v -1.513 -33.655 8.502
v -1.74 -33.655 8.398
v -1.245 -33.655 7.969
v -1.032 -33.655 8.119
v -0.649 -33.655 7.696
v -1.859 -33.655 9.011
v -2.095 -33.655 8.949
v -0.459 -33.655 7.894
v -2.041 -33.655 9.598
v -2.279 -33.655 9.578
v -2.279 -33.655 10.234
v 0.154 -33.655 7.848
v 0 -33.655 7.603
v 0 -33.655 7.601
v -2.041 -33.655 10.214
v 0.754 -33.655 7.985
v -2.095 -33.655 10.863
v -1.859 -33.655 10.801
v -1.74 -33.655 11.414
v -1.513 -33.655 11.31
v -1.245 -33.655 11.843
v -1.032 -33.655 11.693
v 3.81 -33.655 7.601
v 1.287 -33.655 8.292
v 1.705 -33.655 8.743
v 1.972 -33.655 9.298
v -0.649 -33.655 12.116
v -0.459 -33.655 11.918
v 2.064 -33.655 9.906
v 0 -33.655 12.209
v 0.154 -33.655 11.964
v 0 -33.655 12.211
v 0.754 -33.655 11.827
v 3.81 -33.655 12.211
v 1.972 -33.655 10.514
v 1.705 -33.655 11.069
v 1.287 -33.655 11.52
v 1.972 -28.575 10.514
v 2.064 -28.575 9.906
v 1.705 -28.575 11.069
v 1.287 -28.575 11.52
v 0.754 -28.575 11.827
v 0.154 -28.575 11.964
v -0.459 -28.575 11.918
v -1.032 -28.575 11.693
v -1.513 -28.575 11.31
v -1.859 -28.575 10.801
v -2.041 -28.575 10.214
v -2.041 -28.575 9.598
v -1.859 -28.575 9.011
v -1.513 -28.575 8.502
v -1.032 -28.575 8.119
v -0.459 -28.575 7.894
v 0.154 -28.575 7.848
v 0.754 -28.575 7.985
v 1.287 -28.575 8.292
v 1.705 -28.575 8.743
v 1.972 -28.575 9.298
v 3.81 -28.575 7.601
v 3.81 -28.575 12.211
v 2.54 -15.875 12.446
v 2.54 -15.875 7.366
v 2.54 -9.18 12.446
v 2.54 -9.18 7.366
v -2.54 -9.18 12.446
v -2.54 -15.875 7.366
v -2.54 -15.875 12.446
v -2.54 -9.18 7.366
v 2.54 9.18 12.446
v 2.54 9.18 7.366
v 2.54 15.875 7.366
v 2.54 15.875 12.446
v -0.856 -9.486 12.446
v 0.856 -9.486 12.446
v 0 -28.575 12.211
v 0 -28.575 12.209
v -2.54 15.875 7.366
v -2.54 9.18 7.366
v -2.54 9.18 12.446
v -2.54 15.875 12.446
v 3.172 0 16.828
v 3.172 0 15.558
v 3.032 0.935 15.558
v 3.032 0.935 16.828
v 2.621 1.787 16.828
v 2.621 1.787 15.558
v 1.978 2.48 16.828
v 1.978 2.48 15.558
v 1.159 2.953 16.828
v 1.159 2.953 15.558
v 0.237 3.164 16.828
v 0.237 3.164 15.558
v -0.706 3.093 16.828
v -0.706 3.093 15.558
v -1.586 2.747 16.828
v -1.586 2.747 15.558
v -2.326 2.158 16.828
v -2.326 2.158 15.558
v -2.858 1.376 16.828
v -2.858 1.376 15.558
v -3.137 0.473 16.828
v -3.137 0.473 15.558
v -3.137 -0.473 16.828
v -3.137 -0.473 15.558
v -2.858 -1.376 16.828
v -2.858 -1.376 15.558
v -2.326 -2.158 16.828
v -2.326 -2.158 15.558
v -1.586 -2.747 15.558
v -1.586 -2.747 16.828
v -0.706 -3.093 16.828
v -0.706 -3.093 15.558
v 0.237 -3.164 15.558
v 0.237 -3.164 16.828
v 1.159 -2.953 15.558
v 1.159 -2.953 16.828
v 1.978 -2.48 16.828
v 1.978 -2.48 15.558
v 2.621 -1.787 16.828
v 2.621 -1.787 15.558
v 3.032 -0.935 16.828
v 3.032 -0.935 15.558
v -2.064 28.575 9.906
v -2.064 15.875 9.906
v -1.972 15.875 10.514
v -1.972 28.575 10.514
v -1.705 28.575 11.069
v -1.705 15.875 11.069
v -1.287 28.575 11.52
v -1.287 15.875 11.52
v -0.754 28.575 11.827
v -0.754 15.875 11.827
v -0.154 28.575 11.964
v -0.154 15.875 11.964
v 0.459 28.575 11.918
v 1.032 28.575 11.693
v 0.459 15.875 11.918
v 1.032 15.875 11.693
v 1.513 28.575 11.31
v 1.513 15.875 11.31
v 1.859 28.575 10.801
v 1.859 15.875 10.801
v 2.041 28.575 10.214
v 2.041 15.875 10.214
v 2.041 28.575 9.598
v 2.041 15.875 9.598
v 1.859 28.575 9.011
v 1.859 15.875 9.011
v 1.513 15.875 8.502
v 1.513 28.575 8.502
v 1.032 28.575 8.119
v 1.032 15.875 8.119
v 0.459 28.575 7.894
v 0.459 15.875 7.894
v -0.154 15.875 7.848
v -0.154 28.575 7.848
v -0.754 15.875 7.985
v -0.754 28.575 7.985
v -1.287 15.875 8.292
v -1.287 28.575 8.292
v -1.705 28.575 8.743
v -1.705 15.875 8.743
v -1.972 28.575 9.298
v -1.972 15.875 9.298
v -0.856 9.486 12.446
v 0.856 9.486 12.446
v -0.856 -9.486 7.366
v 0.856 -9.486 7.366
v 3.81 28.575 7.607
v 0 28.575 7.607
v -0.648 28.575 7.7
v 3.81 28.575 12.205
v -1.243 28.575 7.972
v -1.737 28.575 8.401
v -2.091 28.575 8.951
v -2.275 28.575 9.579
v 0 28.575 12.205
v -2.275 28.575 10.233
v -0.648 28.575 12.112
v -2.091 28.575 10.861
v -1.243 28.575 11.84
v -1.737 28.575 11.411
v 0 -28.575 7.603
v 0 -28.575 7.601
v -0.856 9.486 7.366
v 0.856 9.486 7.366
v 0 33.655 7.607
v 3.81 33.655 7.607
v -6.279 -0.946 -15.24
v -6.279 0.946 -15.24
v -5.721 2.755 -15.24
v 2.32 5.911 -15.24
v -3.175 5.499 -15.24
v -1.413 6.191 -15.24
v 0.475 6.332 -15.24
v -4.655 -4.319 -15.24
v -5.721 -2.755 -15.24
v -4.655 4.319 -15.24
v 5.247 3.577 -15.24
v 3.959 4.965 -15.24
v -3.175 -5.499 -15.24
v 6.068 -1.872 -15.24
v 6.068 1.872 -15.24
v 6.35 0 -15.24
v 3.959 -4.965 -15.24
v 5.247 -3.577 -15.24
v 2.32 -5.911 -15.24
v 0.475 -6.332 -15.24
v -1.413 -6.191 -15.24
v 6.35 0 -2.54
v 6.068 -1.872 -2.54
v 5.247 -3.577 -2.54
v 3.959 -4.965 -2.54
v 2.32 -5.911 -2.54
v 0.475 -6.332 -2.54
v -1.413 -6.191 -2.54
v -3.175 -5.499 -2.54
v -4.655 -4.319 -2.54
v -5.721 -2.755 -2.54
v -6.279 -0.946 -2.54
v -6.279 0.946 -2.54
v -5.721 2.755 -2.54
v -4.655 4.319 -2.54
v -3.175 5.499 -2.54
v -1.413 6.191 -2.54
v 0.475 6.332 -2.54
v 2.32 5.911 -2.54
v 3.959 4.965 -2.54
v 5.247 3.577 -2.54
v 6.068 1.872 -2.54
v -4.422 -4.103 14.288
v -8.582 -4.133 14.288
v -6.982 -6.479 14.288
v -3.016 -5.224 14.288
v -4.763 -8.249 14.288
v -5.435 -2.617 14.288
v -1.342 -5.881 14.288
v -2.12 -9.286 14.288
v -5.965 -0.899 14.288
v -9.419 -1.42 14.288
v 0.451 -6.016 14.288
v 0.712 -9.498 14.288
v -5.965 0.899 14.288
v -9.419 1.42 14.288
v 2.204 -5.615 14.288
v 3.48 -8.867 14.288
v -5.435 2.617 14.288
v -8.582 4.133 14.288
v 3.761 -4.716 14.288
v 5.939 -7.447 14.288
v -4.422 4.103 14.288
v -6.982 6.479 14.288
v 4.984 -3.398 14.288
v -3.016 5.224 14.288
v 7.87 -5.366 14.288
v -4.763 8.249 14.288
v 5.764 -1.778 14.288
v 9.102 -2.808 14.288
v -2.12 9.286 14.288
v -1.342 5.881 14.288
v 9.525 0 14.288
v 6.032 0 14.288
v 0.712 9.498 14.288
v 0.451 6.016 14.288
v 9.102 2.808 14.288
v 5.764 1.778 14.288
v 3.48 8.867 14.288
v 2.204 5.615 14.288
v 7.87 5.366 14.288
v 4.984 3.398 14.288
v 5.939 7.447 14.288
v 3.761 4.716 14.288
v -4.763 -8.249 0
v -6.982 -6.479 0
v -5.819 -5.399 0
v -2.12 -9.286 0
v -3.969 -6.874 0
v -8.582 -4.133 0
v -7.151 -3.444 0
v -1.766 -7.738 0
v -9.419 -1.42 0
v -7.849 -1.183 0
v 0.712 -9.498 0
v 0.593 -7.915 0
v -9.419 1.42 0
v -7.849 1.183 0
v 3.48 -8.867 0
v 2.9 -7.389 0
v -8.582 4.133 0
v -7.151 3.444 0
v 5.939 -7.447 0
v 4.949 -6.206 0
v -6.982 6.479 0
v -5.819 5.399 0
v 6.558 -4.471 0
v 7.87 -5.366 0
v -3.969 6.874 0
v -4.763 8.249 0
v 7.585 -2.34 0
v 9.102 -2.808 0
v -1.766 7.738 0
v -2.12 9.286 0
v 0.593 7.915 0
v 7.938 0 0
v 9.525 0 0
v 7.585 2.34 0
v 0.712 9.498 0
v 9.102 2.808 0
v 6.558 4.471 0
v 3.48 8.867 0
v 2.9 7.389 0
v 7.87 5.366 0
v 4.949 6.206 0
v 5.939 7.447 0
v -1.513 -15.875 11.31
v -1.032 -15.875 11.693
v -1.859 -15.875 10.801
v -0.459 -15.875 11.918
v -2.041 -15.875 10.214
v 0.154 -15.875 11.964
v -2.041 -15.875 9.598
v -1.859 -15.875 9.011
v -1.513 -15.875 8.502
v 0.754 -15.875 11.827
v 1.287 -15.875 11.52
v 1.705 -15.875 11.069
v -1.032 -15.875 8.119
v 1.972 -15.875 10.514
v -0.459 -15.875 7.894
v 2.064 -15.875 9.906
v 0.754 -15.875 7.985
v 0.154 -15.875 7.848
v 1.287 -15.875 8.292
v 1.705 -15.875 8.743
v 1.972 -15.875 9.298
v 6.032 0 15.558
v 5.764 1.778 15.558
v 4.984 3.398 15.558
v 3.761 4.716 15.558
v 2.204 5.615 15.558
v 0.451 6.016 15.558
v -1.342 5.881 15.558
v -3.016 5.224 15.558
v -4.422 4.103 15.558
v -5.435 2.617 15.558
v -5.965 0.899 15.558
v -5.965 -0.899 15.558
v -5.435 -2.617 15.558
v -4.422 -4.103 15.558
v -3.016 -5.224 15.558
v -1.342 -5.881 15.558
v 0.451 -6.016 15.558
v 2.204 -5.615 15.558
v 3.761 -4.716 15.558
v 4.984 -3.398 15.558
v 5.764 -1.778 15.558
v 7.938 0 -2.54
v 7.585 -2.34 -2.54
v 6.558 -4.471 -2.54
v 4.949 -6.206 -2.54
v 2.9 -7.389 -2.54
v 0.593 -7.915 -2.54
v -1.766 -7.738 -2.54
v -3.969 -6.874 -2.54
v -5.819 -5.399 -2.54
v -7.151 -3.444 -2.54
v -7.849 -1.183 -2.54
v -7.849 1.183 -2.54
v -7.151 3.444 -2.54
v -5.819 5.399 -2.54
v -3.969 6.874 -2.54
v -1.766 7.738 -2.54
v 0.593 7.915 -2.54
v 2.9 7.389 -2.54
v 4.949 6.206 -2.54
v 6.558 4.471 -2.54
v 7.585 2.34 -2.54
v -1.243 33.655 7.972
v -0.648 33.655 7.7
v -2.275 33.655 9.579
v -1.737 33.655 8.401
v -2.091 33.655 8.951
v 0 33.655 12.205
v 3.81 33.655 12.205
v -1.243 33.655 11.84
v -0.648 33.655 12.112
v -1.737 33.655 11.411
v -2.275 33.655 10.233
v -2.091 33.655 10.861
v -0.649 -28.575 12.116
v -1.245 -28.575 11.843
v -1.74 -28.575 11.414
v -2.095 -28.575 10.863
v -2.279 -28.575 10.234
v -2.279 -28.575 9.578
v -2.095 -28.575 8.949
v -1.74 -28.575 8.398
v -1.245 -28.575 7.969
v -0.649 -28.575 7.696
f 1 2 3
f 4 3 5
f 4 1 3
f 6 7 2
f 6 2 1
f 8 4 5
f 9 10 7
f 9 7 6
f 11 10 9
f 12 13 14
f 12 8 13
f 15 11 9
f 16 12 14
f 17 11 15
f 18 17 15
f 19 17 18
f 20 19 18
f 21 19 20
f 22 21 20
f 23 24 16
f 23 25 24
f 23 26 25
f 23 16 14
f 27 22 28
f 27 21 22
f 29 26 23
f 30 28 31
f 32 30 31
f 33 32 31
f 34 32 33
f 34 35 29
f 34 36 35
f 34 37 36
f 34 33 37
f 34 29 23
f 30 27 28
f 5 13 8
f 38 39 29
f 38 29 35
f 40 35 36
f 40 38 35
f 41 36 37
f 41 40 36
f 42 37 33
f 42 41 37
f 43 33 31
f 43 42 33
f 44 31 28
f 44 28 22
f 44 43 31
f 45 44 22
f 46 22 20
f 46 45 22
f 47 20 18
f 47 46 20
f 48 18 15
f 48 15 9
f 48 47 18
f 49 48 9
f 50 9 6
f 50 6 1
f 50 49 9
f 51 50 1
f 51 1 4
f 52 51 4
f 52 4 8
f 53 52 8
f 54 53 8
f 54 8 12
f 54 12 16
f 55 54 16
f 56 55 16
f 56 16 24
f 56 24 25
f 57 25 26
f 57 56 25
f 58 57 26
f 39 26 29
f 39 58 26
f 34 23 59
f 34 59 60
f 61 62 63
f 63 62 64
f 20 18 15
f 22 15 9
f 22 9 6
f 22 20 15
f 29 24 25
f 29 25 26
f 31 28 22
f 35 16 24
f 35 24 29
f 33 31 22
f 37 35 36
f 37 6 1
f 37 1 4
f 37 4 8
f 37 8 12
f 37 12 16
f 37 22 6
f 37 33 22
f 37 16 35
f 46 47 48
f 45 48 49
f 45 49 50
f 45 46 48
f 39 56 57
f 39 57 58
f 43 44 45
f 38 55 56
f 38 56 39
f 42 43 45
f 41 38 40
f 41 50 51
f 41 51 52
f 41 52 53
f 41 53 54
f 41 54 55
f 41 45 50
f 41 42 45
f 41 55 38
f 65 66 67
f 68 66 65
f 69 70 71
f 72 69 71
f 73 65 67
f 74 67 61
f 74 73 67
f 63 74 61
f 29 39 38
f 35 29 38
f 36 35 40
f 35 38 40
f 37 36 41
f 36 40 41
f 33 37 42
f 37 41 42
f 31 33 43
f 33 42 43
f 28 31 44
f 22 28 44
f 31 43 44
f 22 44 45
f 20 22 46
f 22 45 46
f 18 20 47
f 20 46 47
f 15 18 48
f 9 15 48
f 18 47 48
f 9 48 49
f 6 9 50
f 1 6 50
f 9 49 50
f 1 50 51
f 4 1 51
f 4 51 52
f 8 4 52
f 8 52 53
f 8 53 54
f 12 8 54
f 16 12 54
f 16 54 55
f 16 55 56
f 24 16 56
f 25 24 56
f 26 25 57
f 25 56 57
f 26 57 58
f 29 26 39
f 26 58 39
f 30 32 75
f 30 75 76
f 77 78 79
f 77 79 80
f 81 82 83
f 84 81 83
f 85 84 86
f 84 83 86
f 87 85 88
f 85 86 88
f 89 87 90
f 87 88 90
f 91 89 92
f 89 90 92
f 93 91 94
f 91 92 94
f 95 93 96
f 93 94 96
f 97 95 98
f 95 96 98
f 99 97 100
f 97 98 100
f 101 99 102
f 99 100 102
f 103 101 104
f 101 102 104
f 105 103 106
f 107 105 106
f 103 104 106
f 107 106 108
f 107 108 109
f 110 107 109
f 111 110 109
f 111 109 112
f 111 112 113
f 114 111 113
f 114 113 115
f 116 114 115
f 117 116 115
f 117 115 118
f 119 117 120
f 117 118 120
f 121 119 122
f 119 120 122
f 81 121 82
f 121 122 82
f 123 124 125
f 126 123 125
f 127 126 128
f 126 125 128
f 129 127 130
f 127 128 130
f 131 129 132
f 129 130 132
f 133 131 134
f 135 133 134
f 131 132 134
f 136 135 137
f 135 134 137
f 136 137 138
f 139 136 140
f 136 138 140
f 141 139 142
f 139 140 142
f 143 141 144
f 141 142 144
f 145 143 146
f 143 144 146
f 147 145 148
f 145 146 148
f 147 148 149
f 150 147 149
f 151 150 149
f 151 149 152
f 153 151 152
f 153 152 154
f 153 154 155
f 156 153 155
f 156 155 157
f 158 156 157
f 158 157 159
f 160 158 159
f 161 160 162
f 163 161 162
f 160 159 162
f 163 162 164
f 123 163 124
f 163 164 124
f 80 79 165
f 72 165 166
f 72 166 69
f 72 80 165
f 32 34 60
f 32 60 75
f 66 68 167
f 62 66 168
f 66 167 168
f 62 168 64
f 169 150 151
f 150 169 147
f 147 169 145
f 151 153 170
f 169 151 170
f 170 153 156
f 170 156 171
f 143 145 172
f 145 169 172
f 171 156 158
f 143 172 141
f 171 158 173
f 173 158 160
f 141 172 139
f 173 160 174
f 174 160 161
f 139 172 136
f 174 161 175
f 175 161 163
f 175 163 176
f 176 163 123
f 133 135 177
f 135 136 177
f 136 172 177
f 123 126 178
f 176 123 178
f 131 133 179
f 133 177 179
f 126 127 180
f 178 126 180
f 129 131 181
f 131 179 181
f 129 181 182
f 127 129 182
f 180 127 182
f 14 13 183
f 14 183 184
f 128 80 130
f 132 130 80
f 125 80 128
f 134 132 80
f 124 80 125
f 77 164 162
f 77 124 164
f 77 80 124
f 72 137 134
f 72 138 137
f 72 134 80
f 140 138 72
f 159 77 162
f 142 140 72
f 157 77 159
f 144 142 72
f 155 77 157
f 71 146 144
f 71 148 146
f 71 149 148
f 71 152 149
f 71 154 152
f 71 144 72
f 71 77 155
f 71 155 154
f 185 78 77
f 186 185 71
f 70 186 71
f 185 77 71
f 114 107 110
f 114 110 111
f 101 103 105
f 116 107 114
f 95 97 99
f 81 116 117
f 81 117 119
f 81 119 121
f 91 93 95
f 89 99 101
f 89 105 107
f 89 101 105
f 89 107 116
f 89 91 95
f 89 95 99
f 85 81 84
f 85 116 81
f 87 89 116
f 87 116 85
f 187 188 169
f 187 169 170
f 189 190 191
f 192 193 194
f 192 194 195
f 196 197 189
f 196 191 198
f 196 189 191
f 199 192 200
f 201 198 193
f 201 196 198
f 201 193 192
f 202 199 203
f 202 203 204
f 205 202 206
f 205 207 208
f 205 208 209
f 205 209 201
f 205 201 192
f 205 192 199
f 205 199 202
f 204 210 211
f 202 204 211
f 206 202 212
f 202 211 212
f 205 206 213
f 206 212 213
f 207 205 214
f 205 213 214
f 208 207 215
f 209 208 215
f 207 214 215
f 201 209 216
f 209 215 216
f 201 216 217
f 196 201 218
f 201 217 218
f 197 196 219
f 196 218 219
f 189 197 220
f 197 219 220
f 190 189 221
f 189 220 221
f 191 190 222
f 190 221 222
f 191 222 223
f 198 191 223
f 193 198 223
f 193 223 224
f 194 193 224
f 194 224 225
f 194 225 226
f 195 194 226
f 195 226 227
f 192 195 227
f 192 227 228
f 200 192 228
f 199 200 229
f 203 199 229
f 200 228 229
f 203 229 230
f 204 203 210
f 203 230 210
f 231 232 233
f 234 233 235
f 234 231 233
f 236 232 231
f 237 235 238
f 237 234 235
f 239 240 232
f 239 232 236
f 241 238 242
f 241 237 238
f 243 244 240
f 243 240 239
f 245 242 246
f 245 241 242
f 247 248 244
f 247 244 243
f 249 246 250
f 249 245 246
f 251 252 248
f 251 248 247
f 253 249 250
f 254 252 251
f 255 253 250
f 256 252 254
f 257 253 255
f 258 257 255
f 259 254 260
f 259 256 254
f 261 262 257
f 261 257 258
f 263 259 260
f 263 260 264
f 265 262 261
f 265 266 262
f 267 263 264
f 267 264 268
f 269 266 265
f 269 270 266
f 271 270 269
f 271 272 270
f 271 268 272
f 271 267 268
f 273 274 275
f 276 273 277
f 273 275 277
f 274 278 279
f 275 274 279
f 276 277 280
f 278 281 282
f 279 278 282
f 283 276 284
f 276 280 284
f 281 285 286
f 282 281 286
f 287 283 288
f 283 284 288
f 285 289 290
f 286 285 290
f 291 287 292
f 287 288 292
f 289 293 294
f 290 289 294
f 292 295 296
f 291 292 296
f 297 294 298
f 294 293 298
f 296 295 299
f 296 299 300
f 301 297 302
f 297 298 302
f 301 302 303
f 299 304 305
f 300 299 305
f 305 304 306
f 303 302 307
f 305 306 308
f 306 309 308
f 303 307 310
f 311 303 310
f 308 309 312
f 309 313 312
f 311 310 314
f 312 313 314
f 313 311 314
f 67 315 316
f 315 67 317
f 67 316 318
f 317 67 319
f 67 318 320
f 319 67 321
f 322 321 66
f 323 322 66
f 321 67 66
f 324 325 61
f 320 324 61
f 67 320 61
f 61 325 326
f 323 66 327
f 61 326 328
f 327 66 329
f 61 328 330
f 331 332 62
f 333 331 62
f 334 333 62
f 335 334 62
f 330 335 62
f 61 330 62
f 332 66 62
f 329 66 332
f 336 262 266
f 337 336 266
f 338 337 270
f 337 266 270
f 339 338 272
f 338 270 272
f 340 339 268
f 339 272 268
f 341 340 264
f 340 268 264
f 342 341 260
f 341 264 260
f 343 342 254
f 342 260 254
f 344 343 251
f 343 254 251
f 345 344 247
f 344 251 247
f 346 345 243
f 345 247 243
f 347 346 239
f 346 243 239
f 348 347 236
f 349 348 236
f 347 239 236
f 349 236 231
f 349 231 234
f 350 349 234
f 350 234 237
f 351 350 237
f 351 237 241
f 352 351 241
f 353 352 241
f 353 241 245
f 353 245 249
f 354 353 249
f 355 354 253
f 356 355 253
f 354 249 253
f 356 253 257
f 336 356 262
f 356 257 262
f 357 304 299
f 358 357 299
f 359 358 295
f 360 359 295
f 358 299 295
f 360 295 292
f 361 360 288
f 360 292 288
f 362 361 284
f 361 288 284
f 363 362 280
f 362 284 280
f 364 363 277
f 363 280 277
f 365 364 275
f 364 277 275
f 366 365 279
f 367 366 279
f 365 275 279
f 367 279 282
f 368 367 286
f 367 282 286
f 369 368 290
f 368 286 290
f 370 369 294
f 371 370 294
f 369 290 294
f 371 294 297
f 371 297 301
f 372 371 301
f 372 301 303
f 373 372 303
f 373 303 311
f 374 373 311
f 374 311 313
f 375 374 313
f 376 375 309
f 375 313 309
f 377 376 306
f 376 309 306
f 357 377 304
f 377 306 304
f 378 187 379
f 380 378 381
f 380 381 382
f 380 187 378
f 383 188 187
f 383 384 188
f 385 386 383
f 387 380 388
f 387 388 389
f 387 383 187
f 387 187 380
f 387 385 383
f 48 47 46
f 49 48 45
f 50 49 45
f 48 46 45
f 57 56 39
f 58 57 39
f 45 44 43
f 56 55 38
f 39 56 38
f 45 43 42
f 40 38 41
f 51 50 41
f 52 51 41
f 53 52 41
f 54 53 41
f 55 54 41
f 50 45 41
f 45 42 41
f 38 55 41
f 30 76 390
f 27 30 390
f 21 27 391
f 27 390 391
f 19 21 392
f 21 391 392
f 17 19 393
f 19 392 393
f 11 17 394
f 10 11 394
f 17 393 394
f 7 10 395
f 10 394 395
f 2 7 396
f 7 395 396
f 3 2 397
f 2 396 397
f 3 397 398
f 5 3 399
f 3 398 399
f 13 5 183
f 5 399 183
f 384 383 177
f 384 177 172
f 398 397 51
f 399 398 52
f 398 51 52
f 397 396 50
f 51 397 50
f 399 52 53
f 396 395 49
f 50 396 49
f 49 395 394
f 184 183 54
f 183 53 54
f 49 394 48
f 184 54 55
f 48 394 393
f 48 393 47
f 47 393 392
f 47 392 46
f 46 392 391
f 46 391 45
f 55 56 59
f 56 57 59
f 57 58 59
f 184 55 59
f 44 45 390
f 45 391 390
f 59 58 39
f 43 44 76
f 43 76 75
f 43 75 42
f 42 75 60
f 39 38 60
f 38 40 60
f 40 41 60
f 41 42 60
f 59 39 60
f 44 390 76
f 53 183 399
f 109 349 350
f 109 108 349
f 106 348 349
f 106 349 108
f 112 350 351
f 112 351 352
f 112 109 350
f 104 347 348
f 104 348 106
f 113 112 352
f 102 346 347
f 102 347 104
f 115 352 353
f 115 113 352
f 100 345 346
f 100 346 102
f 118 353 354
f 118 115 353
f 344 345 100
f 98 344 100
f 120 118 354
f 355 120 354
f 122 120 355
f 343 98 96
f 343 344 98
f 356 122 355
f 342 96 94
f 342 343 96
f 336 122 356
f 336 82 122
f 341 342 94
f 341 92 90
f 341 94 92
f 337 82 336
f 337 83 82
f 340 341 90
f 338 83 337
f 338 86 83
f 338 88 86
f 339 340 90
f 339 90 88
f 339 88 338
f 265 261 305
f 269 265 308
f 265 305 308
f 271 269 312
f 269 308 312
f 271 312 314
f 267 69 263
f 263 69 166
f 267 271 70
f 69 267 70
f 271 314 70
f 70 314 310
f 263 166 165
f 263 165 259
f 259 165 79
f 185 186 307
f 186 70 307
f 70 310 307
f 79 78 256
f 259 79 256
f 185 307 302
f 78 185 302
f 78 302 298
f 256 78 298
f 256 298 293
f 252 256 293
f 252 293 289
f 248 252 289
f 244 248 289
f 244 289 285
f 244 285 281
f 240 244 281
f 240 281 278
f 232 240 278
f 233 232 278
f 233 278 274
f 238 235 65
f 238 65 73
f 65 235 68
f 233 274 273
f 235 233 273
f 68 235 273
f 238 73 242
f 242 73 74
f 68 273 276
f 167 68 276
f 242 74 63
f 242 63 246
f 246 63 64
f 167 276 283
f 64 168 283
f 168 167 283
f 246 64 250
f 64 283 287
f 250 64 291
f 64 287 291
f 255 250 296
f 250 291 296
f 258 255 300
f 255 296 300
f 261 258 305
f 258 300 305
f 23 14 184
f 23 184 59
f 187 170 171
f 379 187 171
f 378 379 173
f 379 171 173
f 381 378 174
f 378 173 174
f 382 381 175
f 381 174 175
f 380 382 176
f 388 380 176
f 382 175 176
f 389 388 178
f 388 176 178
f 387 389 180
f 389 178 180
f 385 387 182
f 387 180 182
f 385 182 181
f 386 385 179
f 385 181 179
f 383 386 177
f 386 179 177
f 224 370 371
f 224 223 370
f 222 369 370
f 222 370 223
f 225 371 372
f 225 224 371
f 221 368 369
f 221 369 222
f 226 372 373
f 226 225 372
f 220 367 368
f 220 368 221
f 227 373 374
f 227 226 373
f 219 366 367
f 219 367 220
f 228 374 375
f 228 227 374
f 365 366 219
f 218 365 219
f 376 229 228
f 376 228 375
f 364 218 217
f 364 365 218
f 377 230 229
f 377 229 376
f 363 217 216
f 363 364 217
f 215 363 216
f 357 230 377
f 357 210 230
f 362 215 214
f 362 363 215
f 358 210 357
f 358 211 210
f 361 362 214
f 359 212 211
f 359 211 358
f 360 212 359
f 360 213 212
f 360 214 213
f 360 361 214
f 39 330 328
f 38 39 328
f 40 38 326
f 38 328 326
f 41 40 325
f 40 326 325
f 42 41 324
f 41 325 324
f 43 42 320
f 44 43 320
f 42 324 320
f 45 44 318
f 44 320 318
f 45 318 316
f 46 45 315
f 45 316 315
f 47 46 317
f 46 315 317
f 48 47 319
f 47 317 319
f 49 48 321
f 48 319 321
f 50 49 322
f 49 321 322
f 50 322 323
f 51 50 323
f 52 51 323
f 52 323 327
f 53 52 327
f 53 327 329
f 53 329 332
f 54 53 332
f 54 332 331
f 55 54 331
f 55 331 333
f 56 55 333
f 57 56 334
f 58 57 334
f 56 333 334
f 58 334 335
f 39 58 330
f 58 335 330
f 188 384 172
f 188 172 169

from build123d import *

# Parameters (mm, degrees)
F0_R      = 9.525
F1_DEPTH  = 14.2875
F2_R      = 6.0325
F3_DEPTH  = 1.27
F4_R      = 3.17246
F5_DEPTH  = 1.27
F7_W      = 5.08
F7_H      = 31.75
F8_DEPTH  = 5.08
F9_R      = 2.06375
F10_DEPTH = 12.7
F11_R     = 2.06375
F12_DEPTH = 5.08
F13_DEPTH = 5.08
F14_R     = 2.06375
F15_DEPTH = 12.7
F17_R     = 2.06375
F16_R     = 2.06375
F18_DEPTH = 5.08
F19_R     = 7.9375
F20_DEPTH = 2.54
F21_R     = 6.35
F22_DEPTH = 12.7


with BuildPart() as f1:
    # F0 (on Top) → F1 (new body)
    with BuildSketch(Plane.XY):
        Circle(F0_R)
    extrude(amount=F1_DEPTH)

    # F2 (on face) → F3 (join)
    with BuildSketch(Plane.XY.offset(14.2875)):
        Circle(F2_R)
    extrude(amount=F3_DEPTH)

    # F4 (on face) → F5 (join)
    with BuildSketch(Plane.XY.offset(15.5575)):
        Circle(F4_R)
    extrude(amount=F5_DEPTH)

    # F7 (on offset) → F8 (join)
    with BuildSketch(Plane.XY.offset(7.366)):
        Rectangle(F7_W, F7_H)
    extrude(amount=F8_DEPTH)

    # F9 (on face) → F10 (join)
    with BuildSketch(Plane.XZ.offset(15.875)):
        with Locations((0, 9.906)):
            Circle(F9_R)
    extrude(amount=F10_DEPTH)


with BuildPart() as f12:
    # F11 (on face) → F12 (new body)
    with BuildSketch(Plane.XZ.offset(28.575)):
        with BuildLine():
            Line((3.81, 12.2114717778), (0, 12.2114717778))
            Line((0, 12.2114717778), (0, 12.208837398))
            ThreePointArc((0, 12.208837398), (-2.302837398, 9.906), (0, 7.603162602))
            Line((0, 7.603162602), (0, 7.6005282222))
            Line((0, 7.6005282222), (3.81, 7.6005282222))
            Line((3.81, 7.6005282222), (3.81, 12.2114717778))
        make_face()
        with Locations((0, 9.906)):
            Circle(F11_R, mode=Mode.SUBTRACT)
    extrude(amount=F12_DEPTH)


with BuildPart() as f13:
    # F13 (new): a face of the model
    f13_faces = [f1.part.faces().sort_by_distance(p)[0] for p in [
        (0, -28.575, 9.906),
    ]]
    extrude(f13_faces, amount=F13_DEPTH)


with BuildPart() as f1_1:
    add(f1.part)

    # F14 (on face) → F15 (join)
    with BuildSketch(Plane(origin=(0, 15.875, 0), x_dir=(-1, 0, 0), z_dir=(0, 1, 0))):
        with Locations((0, 9.906)):
            Circle(F14_R)
    extrude(amount=F15_DEPTH)

    # F17 (on face) + F16 (on face) → F18 (join)
    with BuildSketch(Plane(origin=(0, 28.575, 0), x_dir=(-1, 0, 0), z_dir=(0, 1, 0))):
        with BuildLine():
            Line((-3.81, 7.6073), (0, 7.6073))
            ThreePointArc((0, 7.6073), (2.2987, 9.906), (0, 12.2047))
            Line((0, 12.2047), (-3.81, 12.2047))
            Line((-3.81, 12.2047), (-3.81, 7.6073))
        make_face()
        with Locations((0, 9.906)):
            Circle(F17_R, mode=Mode.SUBTRACT)
    with BuildSketch(Plane(origin=(0, 28.575, 0), x_dir=(-1, 0, 0), z_dir=(0, 1, 0))):
        with Locations((0, 9.906)):
            Circle(F16_R)
    extrude(amount=F18_DEPTH)

    # F19 (on face) → F20 (join)
    with BuildSketch(Plane(origin=(0, 0, 0), x_dir=(1, 0, 0), z_dir=(0, 0, -1))):
        Circle(F19_R)
    extrude(amount=F20_DEPTH)

    # F21 (on face) → F22 (join)
    with BuildSketch(Plane(origin=(0, 0, -2.54), x_dir=(1, 0, 0), z_dir=(0, 0, -1))):
        Circle(F21_R)
    extrude(amount=F22_DEPTH)


solid = Compound([f12.part, f13.part, f1_1.part])
